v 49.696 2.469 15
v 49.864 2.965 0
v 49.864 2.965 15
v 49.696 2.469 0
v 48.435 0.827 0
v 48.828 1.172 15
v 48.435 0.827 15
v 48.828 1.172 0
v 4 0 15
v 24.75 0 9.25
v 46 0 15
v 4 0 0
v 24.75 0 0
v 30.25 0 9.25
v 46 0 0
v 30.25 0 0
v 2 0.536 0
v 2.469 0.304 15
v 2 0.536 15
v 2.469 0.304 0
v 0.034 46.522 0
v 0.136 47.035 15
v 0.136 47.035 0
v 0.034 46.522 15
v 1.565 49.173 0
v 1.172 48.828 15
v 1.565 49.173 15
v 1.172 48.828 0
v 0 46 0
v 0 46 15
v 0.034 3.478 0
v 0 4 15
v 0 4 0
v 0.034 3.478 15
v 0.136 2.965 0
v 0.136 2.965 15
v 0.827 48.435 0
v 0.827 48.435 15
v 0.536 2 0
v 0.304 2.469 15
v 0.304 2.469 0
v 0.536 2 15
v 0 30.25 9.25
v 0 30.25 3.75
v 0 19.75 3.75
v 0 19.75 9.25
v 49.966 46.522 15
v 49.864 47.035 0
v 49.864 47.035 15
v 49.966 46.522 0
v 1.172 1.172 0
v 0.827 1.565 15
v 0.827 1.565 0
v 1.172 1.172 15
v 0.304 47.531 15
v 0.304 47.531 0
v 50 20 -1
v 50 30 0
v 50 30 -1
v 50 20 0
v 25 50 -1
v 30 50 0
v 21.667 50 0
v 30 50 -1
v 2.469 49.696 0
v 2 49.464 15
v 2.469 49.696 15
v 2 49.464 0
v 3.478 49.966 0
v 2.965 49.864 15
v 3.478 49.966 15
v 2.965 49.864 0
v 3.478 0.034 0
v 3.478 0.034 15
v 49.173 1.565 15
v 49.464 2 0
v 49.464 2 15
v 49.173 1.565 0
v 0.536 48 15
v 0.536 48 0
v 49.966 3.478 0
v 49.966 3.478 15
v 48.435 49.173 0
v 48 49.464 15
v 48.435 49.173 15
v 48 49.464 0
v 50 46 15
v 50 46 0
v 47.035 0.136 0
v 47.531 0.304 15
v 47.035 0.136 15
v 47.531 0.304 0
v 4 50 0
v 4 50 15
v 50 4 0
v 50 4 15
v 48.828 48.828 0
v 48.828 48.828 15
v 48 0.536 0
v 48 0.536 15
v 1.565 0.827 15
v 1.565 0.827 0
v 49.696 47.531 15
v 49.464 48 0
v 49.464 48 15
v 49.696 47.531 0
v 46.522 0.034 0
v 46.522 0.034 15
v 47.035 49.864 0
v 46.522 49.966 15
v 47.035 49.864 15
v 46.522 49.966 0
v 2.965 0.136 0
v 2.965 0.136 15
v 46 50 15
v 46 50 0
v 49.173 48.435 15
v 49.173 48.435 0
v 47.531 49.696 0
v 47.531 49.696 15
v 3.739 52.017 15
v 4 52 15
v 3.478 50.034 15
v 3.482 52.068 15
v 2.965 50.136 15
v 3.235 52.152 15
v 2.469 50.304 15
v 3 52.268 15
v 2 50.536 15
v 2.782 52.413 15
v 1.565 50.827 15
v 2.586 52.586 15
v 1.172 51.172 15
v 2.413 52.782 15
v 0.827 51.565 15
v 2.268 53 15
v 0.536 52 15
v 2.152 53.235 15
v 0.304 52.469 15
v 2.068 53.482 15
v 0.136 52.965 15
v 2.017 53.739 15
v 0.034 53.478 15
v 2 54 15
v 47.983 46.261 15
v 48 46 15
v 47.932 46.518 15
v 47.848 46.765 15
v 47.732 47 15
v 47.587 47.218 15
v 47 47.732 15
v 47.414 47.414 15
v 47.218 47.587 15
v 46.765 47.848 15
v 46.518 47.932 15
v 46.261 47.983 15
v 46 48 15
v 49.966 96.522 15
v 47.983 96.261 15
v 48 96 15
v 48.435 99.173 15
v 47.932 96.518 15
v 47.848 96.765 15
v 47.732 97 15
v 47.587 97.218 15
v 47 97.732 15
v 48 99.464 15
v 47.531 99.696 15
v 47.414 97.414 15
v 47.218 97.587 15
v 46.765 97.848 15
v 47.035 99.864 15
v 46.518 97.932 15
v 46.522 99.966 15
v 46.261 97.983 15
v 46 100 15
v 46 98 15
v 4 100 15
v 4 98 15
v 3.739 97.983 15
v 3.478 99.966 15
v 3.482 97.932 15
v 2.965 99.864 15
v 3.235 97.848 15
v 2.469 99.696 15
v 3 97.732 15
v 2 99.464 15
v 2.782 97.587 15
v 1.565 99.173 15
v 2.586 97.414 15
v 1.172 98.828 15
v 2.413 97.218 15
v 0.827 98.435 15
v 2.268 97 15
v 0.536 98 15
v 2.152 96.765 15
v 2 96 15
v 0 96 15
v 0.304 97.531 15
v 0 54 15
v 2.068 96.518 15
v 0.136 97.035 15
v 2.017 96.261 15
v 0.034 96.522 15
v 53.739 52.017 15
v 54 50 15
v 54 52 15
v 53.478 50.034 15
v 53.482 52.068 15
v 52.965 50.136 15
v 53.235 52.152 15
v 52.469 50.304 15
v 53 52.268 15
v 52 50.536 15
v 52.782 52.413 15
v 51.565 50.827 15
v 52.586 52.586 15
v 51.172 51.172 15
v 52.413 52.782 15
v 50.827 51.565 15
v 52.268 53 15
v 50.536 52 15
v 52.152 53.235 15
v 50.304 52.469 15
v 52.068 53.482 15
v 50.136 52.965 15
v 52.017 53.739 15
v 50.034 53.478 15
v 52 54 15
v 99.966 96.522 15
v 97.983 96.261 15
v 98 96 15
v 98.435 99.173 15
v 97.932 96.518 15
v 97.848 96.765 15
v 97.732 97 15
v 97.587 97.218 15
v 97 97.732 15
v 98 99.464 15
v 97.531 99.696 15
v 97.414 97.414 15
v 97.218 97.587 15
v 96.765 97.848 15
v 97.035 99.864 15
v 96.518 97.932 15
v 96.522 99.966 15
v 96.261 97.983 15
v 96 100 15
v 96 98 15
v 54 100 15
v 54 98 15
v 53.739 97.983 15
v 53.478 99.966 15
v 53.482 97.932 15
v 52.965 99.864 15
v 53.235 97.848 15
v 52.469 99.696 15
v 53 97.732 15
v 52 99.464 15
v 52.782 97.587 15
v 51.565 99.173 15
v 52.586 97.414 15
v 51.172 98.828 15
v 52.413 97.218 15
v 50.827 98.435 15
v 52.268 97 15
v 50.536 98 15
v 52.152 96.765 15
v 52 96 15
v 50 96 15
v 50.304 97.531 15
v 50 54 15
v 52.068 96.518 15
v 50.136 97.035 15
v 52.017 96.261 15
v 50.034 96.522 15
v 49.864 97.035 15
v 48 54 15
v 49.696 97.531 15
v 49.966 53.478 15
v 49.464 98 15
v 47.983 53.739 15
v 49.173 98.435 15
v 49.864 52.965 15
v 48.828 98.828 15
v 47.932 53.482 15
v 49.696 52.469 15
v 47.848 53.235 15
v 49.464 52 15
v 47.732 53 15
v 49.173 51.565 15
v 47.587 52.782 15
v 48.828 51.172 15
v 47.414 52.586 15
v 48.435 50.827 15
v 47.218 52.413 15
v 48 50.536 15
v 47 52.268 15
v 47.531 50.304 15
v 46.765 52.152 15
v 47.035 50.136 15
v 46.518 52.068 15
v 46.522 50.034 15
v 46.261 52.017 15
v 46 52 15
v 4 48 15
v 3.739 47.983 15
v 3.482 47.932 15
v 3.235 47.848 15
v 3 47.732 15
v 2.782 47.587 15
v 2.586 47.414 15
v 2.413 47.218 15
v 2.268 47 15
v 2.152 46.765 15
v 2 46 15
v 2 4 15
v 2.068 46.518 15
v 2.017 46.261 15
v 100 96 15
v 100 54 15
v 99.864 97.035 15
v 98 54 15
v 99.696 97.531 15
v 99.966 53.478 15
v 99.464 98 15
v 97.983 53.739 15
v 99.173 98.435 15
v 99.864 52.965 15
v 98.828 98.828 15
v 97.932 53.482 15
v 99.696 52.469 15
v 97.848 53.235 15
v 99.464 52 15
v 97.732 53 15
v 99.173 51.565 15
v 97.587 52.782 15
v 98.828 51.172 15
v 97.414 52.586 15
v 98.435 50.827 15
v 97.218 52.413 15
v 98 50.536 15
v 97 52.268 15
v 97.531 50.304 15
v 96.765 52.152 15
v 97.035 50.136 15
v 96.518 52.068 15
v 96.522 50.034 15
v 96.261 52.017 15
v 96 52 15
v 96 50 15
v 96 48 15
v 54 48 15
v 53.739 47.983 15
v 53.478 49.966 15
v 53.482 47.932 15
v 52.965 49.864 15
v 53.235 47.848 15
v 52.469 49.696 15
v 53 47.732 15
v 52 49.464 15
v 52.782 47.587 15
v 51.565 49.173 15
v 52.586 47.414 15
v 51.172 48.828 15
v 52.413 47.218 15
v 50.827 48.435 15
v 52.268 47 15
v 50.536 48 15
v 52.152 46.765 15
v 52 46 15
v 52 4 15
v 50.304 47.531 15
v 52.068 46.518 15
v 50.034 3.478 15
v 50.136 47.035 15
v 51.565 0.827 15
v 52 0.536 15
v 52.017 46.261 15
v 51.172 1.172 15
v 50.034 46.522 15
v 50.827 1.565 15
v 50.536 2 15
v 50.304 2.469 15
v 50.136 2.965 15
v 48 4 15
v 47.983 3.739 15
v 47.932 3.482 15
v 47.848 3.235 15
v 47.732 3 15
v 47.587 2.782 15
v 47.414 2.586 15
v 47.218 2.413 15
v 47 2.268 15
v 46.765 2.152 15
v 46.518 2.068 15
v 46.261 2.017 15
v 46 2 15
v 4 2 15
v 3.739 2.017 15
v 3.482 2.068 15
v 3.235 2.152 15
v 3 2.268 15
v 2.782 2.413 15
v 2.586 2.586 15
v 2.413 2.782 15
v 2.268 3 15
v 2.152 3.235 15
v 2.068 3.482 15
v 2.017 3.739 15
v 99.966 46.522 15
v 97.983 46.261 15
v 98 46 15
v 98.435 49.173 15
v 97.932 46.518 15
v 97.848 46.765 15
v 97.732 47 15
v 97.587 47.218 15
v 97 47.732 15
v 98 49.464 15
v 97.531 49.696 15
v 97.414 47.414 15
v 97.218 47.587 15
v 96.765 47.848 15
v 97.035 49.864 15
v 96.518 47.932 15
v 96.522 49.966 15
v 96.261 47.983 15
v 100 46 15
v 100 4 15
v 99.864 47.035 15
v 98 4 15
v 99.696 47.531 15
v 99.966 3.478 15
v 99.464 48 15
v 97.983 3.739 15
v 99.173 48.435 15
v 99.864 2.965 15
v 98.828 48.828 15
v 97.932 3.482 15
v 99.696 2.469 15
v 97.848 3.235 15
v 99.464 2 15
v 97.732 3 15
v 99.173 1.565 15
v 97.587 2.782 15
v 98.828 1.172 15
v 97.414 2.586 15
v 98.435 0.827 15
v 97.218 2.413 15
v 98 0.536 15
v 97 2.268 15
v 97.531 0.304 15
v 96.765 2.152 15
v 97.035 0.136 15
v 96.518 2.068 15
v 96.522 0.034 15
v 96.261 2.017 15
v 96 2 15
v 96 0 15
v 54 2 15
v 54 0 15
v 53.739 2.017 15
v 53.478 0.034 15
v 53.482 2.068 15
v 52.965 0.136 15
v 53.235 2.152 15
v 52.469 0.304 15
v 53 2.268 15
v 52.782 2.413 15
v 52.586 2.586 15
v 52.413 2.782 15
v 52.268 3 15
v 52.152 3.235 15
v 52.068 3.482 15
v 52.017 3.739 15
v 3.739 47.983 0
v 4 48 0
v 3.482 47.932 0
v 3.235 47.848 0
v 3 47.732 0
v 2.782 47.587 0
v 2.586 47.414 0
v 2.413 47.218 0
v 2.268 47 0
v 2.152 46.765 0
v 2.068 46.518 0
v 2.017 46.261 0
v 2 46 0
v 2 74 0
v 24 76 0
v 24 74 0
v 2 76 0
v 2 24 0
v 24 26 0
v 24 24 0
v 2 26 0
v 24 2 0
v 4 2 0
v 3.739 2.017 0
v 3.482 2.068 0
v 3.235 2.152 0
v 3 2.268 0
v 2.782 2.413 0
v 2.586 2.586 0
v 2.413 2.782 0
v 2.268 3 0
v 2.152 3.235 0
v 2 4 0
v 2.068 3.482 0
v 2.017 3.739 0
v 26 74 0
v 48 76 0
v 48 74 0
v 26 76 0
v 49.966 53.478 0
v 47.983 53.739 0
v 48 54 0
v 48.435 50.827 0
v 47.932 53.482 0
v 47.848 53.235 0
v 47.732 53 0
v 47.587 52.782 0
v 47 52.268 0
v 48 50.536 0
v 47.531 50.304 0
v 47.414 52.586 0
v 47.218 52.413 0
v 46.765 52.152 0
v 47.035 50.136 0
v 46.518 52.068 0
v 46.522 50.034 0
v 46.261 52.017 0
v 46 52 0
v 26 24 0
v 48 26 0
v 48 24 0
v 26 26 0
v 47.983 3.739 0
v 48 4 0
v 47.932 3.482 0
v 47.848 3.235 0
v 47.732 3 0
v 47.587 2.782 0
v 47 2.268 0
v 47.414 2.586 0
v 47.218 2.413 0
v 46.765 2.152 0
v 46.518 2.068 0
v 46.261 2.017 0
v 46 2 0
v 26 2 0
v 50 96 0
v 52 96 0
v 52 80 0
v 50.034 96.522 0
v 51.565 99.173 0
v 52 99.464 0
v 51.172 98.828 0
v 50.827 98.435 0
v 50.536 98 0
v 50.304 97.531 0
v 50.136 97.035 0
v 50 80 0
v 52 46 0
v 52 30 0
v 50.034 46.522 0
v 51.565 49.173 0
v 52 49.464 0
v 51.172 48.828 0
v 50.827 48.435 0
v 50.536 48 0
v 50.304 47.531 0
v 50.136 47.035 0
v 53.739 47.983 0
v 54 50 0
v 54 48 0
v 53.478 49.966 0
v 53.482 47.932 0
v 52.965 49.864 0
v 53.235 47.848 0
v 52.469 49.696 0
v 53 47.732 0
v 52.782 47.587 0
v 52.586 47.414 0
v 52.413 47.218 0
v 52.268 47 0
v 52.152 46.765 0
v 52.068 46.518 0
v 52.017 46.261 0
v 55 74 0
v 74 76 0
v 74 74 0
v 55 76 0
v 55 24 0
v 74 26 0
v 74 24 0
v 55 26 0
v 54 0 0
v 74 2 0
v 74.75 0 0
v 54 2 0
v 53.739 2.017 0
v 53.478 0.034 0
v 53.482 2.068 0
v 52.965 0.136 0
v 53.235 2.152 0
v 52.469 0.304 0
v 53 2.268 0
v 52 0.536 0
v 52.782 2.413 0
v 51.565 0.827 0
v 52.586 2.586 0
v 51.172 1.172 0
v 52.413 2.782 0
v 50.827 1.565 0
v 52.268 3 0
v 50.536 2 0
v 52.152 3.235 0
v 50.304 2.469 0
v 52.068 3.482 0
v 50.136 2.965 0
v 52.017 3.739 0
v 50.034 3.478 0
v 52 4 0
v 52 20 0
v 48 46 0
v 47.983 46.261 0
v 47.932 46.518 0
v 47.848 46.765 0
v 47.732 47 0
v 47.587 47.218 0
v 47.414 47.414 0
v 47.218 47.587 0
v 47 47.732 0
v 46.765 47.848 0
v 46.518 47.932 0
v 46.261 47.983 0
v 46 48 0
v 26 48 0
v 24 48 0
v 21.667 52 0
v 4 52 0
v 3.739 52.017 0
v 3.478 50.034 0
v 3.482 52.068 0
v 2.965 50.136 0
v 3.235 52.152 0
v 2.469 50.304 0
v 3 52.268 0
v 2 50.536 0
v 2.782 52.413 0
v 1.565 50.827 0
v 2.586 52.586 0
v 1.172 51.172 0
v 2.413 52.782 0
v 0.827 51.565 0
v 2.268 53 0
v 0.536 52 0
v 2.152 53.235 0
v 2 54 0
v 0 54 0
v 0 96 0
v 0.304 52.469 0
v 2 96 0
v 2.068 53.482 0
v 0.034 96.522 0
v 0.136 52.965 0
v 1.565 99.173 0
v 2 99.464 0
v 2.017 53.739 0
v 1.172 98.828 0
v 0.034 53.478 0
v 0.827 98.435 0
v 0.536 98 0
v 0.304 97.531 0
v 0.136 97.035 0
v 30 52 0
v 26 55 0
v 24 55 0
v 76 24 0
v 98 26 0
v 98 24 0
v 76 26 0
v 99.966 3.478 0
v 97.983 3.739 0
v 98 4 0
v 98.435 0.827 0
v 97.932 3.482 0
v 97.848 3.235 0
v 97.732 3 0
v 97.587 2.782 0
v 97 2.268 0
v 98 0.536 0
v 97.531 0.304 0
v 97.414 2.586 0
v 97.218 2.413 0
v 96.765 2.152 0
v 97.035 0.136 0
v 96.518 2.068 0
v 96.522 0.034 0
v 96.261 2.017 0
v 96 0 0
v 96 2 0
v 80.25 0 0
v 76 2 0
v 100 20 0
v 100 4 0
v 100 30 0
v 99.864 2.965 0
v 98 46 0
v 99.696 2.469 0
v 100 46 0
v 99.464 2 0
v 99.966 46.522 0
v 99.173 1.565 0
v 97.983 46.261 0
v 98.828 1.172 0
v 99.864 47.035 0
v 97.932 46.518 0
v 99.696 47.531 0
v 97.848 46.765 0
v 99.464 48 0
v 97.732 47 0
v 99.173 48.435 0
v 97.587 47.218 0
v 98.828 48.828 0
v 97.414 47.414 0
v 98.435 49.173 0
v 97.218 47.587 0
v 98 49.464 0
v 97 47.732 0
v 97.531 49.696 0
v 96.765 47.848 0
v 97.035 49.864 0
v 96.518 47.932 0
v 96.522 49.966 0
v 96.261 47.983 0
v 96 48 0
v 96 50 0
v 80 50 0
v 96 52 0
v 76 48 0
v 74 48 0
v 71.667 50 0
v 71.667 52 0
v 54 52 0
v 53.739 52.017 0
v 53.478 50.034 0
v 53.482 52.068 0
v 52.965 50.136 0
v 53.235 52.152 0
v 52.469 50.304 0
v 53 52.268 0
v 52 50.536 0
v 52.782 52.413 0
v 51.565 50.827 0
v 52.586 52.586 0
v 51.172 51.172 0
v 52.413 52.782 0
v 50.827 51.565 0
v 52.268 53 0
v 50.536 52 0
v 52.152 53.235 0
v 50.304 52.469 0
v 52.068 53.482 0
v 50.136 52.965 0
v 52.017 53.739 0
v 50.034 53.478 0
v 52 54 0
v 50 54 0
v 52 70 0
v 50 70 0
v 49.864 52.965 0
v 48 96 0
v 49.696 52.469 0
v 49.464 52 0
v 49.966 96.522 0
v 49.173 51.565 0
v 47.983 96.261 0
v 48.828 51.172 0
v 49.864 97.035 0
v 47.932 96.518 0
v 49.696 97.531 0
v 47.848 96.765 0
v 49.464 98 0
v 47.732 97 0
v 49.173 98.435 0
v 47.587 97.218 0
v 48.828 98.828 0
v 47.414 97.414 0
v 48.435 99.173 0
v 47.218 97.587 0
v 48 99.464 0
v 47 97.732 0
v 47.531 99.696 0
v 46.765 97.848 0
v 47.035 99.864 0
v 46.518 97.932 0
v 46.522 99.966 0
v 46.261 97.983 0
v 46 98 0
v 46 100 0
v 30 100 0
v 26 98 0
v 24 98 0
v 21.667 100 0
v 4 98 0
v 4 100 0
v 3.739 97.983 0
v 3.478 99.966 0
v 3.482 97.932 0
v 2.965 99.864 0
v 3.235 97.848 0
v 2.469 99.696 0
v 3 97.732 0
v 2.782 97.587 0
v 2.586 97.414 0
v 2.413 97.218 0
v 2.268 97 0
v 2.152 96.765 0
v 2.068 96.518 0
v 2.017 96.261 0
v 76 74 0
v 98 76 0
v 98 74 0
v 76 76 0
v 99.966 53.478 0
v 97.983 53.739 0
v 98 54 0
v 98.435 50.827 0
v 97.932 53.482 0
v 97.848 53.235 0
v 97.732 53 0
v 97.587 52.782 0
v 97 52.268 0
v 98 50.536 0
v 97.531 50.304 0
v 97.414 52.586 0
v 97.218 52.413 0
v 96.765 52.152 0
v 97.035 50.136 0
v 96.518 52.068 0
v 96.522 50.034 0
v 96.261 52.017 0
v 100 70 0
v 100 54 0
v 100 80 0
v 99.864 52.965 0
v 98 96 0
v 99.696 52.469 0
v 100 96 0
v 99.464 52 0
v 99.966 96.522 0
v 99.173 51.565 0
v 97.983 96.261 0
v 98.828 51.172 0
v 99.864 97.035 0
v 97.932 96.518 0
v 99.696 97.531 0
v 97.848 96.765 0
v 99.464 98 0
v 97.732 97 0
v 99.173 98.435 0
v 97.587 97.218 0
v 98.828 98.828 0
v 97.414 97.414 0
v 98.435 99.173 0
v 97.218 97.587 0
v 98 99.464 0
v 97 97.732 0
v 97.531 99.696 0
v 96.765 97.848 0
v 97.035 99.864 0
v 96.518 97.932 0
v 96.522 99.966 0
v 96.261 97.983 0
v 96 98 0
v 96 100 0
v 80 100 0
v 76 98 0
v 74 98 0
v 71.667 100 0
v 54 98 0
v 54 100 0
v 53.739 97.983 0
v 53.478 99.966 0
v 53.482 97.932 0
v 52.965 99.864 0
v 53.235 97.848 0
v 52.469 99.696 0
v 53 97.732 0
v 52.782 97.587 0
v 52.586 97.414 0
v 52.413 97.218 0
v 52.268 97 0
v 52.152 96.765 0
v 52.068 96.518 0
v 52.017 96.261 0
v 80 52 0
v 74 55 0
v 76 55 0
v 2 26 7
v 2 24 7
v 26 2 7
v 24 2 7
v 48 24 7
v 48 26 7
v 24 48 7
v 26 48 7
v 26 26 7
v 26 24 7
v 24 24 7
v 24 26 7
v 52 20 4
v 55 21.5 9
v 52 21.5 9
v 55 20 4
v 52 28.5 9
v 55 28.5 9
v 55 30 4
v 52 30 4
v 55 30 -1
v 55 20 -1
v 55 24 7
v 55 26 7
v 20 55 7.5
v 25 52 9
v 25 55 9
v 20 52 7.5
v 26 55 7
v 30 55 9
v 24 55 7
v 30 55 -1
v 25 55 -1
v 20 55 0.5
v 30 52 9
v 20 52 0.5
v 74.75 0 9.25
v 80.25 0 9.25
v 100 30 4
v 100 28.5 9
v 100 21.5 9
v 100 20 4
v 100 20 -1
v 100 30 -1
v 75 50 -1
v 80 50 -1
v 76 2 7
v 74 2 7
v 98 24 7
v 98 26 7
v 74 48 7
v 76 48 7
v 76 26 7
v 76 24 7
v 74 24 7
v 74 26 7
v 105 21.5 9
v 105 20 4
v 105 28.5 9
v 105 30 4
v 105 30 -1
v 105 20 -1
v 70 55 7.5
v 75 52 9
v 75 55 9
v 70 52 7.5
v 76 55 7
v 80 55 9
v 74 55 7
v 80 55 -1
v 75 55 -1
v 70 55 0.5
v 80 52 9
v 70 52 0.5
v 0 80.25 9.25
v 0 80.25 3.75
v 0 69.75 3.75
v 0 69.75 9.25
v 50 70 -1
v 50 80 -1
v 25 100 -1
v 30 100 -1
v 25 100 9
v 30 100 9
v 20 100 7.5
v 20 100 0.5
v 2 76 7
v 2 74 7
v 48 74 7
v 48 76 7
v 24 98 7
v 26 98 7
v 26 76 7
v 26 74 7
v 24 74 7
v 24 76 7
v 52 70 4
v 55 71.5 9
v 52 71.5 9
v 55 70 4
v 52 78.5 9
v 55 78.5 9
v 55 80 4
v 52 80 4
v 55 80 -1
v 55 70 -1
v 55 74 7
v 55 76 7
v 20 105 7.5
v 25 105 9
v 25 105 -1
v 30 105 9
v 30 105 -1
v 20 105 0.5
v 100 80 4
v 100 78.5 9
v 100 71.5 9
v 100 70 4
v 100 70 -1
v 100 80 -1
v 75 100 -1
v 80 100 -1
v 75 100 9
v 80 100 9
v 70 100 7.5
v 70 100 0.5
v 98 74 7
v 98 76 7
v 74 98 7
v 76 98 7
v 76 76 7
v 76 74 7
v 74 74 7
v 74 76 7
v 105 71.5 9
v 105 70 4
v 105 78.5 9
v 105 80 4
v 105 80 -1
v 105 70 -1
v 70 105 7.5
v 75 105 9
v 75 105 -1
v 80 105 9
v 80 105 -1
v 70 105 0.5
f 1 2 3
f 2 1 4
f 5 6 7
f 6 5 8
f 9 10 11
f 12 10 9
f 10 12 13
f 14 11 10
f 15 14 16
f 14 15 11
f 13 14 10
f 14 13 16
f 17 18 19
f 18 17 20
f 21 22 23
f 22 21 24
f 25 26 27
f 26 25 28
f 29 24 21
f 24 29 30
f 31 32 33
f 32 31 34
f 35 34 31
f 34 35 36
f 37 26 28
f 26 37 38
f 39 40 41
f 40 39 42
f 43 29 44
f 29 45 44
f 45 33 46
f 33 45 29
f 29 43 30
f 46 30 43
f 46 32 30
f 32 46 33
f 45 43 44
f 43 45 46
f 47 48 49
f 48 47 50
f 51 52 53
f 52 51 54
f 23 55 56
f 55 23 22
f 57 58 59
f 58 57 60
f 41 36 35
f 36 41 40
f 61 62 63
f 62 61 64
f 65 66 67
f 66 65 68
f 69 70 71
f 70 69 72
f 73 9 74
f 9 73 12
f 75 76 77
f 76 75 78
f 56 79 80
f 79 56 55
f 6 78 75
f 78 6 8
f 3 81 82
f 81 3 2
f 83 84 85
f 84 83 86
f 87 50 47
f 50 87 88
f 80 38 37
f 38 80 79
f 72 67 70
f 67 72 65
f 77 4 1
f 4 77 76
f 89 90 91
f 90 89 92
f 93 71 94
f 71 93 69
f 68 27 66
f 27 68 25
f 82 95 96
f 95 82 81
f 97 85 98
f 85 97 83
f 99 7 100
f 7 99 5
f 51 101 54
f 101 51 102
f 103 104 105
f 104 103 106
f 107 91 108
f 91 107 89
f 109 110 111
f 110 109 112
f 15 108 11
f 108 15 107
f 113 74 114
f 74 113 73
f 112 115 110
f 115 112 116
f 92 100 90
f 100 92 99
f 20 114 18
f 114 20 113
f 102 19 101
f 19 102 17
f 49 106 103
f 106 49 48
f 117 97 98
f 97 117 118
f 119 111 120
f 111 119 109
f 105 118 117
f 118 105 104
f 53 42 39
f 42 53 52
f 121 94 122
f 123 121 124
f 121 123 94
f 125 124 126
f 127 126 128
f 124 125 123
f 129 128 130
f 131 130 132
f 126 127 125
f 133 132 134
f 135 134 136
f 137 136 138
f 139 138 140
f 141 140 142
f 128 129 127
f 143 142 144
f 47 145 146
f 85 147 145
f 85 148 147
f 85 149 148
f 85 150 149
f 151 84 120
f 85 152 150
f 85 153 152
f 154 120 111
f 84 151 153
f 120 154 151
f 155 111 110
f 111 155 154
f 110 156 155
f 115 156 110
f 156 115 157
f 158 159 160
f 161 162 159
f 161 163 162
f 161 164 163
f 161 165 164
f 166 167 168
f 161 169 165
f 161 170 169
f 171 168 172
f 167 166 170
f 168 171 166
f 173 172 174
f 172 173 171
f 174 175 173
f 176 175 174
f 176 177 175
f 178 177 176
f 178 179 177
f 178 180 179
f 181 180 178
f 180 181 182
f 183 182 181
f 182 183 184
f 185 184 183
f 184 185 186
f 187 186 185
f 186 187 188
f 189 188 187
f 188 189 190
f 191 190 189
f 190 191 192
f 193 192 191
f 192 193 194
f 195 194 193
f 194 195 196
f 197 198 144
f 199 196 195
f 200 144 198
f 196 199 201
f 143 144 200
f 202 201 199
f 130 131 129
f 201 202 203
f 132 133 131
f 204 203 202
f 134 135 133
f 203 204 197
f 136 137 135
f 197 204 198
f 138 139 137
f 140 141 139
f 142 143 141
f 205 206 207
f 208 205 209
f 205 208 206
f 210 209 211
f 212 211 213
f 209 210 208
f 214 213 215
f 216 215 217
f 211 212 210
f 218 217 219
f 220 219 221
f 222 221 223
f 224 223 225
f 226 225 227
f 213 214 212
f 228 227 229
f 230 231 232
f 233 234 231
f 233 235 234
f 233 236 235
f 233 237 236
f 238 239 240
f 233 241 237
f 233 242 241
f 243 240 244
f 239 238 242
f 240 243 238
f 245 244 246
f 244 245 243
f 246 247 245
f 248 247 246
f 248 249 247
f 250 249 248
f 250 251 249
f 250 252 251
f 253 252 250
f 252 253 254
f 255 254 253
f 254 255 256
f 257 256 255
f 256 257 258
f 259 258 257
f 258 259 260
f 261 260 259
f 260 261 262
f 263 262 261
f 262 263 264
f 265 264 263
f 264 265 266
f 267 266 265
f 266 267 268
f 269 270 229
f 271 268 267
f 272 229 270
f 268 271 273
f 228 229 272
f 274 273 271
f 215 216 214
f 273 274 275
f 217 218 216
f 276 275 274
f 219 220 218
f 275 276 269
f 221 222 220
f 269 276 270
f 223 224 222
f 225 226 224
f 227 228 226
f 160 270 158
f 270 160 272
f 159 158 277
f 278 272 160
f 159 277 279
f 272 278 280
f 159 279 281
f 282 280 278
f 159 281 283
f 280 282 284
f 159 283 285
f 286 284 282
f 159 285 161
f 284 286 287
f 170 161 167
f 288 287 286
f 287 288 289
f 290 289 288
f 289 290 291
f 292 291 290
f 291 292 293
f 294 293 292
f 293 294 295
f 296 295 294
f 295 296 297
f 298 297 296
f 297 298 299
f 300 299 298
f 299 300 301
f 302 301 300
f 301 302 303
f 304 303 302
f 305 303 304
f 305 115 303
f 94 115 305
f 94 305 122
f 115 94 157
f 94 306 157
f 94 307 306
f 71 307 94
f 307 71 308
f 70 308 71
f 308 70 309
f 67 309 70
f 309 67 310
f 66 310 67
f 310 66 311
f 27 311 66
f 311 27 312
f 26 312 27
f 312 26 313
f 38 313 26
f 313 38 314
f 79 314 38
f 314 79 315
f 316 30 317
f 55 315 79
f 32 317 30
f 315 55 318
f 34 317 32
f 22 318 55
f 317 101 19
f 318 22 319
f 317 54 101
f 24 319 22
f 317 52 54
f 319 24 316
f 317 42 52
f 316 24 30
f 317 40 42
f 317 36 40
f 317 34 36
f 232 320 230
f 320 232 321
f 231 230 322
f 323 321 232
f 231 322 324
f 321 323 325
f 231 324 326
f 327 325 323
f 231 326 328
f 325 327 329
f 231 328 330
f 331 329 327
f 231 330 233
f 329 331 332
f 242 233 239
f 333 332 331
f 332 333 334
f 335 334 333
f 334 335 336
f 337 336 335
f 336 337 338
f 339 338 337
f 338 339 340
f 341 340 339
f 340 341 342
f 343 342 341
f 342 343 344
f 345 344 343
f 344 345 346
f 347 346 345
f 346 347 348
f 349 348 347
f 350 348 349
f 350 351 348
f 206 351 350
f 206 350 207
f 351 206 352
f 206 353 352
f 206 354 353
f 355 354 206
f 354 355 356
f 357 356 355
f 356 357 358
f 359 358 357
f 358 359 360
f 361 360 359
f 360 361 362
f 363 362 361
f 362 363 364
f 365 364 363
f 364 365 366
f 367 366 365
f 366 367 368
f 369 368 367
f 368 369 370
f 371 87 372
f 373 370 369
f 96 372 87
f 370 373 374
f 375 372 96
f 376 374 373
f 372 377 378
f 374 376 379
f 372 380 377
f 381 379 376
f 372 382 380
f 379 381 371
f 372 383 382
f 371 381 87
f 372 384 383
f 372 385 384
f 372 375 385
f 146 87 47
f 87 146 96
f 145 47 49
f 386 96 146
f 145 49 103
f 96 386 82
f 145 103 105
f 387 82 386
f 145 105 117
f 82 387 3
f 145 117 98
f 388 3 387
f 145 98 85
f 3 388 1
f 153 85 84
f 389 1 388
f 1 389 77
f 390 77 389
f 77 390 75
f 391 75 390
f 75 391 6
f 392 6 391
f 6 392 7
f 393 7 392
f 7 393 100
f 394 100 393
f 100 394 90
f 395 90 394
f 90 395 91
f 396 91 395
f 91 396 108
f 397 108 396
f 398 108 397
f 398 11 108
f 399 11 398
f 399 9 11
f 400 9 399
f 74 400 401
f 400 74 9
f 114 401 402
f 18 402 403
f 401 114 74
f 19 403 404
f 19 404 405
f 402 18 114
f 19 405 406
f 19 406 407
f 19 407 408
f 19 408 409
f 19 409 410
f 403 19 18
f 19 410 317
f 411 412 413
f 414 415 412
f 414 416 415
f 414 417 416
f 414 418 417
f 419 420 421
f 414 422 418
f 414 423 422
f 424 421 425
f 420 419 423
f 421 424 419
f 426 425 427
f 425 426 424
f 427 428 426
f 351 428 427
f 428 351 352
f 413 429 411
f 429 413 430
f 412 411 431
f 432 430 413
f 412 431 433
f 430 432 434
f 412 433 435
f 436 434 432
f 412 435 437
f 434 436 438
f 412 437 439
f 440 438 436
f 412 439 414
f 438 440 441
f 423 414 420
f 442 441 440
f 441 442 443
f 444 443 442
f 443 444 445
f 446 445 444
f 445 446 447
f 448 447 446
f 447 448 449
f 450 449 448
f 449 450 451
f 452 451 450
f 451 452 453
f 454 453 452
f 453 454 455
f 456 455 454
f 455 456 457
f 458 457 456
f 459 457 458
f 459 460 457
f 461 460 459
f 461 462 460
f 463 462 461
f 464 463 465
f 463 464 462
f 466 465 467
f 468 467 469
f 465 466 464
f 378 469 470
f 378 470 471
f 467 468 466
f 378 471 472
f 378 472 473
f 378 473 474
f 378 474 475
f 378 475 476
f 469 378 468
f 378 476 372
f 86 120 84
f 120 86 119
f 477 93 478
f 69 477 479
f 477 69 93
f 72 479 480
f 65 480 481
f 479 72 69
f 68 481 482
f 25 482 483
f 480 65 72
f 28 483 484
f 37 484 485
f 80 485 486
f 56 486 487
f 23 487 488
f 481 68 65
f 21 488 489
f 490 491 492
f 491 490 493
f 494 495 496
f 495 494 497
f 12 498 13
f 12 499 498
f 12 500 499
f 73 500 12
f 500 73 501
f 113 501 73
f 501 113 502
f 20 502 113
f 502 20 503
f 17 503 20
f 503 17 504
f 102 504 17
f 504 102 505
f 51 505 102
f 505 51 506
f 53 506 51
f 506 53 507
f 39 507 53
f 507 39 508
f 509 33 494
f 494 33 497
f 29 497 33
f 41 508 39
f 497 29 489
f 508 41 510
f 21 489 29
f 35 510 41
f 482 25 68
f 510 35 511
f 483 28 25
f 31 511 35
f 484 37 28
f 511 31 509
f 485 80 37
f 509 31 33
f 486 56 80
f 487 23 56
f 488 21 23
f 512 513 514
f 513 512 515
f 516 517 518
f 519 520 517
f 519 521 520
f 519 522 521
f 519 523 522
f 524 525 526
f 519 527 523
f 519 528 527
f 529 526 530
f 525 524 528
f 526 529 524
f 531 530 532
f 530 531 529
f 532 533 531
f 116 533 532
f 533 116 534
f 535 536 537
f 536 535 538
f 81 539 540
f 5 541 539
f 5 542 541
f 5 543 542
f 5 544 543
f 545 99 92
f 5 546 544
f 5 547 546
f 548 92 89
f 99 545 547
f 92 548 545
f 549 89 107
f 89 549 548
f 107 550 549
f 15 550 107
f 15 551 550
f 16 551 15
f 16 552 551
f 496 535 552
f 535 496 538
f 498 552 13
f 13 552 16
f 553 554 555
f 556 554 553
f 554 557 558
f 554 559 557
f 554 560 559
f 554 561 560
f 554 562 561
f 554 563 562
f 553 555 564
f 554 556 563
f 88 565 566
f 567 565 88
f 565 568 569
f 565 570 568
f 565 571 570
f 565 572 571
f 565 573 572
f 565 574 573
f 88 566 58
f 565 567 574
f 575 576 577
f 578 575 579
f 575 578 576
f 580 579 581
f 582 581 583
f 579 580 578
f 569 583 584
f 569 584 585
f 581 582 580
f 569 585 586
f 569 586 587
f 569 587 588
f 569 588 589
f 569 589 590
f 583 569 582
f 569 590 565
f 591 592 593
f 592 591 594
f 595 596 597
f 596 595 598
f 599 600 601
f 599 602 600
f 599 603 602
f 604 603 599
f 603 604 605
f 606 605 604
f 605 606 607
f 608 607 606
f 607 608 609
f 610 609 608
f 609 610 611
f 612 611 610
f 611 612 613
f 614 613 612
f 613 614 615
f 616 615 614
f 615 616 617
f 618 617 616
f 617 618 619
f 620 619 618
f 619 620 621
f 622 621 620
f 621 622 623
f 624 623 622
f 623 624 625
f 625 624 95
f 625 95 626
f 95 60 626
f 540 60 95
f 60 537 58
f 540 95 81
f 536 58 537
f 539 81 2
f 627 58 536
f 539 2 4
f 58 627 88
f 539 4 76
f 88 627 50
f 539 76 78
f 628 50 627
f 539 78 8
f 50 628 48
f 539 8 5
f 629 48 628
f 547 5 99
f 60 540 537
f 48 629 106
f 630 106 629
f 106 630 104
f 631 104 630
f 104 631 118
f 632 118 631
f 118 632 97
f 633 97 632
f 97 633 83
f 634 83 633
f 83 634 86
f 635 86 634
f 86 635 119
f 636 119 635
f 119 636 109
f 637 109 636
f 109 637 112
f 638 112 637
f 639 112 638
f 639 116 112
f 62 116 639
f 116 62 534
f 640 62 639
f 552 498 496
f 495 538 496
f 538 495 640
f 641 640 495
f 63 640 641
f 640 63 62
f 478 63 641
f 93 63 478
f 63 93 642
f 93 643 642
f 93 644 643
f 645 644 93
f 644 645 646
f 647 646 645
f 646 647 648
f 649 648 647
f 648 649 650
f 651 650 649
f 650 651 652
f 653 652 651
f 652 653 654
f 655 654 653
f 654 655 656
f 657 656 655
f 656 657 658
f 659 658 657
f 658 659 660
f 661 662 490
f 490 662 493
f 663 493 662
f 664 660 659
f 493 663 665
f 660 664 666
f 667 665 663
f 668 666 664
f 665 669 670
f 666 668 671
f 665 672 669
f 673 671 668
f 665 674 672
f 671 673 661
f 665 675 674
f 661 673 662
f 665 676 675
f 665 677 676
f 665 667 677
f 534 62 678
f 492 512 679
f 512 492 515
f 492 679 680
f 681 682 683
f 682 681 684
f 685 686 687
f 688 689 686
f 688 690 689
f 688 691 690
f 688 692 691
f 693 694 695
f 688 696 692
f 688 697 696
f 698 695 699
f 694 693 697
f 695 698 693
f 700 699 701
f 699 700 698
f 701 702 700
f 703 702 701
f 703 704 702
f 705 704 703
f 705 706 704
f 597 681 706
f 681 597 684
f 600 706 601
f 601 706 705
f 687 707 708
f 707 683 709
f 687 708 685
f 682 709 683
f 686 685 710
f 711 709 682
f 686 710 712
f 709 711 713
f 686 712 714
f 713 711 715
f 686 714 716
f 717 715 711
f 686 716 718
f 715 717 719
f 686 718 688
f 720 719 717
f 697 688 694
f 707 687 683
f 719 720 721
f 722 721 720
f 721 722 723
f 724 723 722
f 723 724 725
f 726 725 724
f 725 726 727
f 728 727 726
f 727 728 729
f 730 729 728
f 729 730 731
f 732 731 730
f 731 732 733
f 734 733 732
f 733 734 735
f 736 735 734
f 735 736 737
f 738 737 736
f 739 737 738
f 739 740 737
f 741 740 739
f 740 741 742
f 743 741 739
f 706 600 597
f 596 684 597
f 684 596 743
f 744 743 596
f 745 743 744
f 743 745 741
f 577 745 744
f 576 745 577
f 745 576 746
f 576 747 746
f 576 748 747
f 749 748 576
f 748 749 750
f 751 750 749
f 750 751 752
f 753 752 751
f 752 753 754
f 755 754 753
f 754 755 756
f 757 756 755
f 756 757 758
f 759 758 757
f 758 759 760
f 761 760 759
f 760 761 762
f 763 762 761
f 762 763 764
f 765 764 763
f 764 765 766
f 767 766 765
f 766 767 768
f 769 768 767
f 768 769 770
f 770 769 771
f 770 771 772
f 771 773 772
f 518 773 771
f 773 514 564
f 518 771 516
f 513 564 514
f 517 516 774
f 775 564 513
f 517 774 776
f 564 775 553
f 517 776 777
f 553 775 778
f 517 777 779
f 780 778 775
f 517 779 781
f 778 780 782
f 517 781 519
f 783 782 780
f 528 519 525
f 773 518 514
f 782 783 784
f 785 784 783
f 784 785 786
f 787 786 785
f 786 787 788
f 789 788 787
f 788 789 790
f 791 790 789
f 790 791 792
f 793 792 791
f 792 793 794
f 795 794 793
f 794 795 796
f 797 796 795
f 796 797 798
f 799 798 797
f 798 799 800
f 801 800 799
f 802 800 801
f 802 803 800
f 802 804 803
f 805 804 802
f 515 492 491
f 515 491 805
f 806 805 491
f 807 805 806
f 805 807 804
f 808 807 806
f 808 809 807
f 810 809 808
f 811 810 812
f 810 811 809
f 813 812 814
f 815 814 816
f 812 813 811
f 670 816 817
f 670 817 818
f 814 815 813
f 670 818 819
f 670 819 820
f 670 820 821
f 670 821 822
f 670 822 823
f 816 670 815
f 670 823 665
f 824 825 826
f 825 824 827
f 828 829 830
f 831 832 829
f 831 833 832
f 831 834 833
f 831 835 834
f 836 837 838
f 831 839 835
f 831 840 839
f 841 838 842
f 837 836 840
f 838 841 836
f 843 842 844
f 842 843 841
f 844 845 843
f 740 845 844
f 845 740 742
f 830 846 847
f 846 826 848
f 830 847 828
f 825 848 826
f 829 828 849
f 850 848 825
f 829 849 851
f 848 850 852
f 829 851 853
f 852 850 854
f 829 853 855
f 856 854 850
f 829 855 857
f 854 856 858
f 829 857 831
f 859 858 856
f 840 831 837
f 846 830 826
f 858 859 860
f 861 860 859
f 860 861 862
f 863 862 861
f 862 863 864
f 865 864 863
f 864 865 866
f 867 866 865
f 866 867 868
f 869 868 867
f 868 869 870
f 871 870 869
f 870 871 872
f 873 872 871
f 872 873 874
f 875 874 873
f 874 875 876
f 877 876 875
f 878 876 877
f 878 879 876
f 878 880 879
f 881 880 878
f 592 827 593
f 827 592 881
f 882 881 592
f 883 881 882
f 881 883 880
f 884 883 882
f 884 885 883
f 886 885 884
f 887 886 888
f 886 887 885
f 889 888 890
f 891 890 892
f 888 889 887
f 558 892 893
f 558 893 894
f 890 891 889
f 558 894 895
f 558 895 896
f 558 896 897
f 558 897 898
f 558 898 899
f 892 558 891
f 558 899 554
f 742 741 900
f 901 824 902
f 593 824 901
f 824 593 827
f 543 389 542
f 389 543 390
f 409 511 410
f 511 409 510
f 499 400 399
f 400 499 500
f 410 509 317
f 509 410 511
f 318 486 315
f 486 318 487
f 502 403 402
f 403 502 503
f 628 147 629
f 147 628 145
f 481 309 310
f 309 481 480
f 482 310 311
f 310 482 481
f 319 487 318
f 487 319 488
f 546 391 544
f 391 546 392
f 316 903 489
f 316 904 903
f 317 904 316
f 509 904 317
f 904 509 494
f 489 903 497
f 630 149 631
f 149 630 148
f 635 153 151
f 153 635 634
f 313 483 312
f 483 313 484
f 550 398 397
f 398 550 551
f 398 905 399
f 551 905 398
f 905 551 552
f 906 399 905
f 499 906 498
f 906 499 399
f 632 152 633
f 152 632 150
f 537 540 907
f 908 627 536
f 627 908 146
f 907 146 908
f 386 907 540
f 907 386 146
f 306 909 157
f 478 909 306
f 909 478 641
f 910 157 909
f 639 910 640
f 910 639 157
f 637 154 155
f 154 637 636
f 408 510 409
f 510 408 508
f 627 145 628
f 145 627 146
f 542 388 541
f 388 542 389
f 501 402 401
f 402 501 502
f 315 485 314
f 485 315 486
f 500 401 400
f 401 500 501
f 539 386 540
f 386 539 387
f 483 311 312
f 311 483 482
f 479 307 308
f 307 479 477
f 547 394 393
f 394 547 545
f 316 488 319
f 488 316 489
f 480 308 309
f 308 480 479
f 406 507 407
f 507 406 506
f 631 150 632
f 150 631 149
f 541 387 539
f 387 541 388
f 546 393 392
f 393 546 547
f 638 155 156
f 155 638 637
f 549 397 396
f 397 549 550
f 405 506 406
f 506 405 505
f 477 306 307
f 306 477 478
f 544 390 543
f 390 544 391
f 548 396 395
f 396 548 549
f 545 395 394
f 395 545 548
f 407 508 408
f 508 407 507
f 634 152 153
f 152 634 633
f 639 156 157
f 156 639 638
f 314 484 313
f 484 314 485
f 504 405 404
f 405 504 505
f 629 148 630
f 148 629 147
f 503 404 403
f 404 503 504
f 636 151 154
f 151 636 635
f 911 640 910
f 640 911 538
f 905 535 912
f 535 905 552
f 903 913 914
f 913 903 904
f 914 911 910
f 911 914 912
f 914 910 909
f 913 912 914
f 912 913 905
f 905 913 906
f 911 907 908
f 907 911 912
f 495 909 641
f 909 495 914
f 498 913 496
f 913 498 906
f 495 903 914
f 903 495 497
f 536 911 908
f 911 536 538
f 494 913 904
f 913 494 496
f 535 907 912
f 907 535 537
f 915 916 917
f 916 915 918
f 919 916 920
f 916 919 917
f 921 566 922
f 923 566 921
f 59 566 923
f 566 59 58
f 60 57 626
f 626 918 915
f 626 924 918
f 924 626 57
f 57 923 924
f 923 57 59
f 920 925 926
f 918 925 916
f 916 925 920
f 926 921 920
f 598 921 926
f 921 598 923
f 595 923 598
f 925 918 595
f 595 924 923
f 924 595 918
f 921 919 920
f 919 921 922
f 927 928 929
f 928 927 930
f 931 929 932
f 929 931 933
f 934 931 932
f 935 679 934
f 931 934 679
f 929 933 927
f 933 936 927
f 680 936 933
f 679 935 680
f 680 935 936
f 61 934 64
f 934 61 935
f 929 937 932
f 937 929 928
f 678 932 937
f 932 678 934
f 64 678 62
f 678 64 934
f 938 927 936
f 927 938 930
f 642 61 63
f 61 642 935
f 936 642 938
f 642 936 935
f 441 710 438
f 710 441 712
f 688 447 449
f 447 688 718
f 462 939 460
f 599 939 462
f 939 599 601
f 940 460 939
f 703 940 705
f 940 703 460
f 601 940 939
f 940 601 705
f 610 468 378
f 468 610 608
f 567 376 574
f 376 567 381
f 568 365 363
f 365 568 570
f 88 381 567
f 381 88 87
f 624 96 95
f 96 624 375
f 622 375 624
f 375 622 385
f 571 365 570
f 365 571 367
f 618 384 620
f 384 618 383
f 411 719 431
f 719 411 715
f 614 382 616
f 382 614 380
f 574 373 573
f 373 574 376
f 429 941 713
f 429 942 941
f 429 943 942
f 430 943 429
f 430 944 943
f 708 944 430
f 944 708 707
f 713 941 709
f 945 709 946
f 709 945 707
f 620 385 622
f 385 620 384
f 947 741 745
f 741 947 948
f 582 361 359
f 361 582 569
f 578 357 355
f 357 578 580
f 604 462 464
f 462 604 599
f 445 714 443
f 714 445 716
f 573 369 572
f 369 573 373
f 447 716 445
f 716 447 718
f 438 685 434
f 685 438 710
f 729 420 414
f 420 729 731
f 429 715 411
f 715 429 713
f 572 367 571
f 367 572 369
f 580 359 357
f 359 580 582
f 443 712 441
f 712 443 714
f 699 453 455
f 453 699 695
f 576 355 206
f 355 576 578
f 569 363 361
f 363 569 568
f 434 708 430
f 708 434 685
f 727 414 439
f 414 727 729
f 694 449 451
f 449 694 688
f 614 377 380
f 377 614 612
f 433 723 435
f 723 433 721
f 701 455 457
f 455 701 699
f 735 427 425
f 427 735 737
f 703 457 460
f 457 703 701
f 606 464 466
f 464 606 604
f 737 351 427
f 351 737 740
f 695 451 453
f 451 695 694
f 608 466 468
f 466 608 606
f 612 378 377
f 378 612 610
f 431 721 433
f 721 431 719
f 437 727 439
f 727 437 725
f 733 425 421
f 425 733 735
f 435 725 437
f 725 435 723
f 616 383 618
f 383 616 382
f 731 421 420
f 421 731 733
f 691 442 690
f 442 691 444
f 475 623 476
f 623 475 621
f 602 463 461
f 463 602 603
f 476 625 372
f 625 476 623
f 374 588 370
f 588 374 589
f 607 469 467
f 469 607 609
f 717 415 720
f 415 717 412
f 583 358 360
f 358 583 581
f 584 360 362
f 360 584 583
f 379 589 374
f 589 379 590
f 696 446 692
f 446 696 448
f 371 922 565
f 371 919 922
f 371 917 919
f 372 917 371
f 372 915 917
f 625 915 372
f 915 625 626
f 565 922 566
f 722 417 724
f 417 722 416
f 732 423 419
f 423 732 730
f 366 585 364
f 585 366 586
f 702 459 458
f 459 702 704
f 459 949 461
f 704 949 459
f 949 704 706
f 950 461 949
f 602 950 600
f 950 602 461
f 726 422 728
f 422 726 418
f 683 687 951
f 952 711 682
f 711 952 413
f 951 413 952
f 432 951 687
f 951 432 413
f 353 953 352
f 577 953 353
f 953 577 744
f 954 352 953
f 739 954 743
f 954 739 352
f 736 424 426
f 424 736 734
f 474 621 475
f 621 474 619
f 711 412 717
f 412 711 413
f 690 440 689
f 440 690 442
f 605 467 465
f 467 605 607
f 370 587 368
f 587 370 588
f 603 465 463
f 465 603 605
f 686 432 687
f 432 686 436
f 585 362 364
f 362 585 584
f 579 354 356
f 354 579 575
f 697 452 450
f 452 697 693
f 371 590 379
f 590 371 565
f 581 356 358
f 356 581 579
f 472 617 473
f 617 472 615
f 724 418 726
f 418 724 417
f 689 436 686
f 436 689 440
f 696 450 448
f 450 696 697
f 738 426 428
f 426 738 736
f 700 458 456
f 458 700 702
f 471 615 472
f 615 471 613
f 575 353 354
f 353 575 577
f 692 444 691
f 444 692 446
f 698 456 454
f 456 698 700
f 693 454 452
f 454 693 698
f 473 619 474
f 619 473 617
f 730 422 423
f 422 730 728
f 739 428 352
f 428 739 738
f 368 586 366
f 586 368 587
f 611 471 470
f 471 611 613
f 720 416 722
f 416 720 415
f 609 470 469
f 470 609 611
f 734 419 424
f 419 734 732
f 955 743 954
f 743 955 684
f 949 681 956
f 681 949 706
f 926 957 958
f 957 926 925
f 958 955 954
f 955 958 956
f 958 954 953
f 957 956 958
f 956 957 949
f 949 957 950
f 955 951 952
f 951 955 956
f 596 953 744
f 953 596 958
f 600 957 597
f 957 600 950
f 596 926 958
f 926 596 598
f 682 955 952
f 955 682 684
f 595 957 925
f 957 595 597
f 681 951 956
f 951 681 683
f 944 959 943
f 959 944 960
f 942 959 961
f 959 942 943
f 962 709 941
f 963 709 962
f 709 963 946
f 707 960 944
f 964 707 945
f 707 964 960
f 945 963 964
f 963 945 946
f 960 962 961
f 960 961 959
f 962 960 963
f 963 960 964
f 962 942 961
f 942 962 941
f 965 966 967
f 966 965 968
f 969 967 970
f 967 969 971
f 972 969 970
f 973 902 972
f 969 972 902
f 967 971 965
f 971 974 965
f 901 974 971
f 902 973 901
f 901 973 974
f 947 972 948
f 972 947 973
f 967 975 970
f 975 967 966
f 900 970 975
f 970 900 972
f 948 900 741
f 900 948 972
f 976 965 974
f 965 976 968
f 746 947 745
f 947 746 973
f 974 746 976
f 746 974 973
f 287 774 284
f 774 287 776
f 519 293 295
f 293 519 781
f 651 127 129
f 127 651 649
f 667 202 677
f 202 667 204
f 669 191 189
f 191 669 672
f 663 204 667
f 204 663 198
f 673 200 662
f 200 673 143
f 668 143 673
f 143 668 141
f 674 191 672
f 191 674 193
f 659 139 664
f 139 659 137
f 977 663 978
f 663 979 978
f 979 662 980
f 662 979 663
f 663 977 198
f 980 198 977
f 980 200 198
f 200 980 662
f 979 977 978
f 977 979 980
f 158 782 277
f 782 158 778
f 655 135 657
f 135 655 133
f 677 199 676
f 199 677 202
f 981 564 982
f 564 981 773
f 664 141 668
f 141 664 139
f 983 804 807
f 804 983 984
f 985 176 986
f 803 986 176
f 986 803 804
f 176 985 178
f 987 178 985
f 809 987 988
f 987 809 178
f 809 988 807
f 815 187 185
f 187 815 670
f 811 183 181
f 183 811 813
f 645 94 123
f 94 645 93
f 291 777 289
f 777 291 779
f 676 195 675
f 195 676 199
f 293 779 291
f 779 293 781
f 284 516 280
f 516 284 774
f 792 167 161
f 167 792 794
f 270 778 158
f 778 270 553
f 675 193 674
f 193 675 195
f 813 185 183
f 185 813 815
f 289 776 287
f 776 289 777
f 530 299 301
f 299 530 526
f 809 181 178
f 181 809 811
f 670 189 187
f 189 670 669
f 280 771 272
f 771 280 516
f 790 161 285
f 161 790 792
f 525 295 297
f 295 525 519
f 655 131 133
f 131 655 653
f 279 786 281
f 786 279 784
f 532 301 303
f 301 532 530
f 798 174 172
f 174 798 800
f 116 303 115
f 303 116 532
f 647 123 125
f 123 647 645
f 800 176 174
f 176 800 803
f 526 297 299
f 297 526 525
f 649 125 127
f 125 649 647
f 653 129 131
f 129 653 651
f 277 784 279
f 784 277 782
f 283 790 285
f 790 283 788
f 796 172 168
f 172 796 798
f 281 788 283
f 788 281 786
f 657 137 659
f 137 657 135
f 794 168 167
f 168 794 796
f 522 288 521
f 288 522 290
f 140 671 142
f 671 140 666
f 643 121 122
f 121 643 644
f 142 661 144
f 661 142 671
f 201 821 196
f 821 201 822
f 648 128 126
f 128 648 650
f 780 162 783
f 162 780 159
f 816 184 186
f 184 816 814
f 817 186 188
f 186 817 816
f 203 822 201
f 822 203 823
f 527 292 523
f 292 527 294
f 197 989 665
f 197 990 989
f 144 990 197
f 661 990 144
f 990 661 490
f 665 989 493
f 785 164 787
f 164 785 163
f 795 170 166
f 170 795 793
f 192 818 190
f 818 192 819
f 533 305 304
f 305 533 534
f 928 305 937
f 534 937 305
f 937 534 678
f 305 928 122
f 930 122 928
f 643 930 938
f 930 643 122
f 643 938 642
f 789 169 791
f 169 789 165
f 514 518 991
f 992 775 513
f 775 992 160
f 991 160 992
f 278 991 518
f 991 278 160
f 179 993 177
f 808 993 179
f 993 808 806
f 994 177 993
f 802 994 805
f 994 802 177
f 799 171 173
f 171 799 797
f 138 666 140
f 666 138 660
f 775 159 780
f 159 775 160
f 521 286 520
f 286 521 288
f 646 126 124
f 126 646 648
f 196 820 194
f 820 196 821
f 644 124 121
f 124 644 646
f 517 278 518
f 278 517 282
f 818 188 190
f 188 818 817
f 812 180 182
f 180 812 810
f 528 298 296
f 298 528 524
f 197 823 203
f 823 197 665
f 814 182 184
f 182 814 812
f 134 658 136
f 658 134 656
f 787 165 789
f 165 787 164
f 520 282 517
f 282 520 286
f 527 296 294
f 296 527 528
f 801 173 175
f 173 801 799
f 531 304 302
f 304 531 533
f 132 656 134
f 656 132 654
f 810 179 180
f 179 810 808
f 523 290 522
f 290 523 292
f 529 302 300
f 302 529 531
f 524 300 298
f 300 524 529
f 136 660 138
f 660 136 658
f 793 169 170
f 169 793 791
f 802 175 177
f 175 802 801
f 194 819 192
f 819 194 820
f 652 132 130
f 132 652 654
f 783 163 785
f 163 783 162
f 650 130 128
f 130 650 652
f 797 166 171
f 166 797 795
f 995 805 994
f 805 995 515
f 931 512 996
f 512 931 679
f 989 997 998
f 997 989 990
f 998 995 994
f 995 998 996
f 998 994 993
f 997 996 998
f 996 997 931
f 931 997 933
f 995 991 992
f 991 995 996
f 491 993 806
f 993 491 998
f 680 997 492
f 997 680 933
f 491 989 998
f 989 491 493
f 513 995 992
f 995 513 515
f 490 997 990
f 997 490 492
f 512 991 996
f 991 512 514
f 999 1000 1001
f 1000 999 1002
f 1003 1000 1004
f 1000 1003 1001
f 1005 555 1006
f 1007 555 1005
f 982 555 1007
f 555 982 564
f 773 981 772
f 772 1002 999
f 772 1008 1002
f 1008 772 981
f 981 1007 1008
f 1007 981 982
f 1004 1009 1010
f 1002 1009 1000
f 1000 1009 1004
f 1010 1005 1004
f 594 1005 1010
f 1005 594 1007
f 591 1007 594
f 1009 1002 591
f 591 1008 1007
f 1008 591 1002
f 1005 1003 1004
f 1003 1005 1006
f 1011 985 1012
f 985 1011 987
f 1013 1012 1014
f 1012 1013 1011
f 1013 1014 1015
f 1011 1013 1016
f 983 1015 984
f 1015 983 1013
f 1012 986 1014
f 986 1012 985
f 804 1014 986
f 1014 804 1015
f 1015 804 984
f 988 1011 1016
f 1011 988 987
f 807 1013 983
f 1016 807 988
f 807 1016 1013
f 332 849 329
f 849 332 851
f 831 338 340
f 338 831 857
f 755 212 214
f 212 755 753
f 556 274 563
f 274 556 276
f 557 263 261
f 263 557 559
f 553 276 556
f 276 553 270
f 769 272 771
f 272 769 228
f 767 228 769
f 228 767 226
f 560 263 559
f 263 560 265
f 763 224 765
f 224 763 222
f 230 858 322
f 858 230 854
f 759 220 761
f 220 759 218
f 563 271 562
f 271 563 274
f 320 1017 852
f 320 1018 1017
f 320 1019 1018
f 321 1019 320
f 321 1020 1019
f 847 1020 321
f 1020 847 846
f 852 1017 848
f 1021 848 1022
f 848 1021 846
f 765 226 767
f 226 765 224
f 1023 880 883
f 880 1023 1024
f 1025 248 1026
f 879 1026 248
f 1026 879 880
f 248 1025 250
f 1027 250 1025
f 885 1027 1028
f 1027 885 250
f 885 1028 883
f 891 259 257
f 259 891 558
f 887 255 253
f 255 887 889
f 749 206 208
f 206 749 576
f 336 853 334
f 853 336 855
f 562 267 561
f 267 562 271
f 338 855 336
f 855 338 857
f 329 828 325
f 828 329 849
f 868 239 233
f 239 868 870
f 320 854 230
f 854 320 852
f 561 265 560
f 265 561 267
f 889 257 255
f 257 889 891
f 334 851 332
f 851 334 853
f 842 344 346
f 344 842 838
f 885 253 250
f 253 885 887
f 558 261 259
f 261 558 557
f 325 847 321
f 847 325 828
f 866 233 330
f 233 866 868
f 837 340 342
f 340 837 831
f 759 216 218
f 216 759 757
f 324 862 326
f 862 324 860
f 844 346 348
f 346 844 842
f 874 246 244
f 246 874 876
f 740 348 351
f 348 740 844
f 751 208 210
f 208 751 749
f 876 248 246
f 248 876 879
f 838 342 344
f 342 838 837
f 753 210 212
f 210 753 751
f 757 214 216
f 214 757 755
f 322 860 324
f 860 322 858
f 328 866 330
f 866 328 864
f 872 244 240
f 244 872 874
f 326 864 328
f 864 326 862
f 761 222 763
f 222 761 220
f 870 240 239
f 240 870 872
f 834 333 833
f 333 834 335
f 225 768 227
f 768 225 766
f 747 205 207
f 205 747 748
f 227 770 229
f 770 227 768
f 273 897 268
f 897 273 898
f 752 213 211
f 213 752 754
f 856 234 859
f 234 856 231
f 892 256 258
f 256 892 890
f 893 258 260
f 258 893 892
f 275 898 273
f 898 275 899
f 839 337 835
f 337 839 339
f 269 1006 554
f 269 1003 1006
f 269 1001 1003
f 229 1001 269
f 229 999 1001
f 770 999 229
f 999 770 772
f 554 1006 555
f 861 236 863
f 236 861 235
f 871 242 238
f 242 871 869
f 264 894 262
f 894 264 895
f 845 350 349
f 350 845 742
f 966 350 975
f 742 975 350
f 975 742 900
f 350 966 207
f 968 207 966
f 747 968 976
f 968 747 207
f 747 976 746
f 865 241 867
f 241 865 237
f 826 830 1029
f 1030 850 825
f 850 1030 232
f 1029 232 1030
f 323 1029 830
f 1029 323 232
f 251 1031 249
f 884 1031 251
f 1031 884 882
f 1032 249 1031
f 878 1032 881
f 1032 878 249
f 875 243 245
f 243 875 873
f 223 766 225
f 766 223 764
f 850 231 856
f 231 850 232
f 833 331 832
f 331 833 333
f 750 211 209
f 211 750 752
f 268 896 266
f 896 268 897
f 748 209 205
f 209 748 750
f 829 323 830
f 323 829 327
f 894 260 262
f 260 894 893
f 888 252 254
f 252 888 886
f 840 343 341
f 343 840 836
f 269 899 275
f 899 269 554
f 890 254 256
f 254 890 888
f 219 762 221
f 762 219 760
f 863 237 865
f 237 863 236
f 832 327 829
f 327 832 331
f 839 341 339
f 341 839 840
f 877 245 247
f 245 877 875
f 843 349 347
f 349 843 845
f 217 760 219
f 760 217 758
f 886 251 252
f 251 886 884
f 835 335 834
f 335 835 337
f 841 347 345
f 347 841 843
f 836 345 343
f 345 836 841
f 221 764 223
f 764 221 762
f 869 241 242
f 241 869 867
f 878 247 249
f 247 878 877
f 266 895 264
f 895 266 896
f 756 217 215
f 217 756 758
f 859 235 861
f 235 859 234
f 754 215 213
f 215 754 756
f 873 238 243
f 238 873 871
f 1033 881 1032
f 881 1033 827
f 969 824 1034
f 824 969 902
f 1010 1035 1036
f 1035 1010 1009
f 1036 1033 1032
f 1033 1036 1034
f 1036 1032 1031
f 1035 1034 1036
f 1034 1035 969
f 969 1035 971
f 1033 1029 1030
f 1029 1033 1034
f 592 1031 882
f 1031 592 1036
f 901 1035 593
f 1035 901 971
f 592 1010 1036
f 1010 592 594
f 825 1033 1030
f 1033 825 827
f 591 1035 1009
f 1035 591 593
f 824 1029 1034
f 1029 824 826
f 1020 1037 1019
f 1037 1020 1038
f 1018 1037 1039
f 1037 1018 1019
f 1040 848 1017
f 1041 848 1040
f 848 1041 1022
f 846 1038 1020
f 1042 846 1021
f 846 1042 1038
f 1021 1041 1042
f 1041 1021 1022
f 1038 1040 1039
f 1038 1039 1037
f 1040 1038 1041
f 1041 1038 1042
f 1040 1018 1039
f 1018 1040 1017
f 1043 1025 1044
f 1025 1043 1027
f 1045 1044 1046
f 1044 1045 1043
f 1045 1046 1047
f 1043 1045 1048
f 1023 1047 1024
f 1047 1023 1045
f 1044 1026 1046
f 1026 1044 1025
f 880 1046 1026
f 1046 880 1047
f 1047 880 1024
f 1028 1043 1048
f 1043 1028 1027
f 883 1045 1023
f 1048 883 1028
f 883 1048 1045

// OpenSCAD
//
// MODULAR PANEL SYSTEM
//
// Sizes:
//   S = 50 x 50 x 15 mm
//   M = 100 x 100 x 15 mm
//   L = 250 x 250 x 15 mm
//
// Units: mm
//

$fn = 48;


// ============================================================
// PARAMETERS
// ============================================================

WALL        = 2.0;
TOP         = 0.0;
BOTTOM      = 0.0;

CORNER_R    = 4.0;

PANEL_H     = 15;

// Connector
JOIN_W      = 10;
JOIN_H      = 5;
JOIN_DEPTH  = 5;

CLEARANCE   = 0.25;

DOVETAIL_HEAD_W = 7;
DOVETAIL_BASE_W = 10;

RIB          = 2;
RIB_H        = 7;


// ============================================================
// BASIC GEOMETRY
// ============================================================

module rounded_rect(w, d, r)
{
    hull()
    {
        translate([r, r])
            circle(r);

        translate([w-r, r])
            circle(r);

        translate([r, d-r])
            circle(r);

        translate([w-r, d-r])
            circle(r);
    }
}


// ============================================================
// PANEL OUTER SHELL
// ============================================================

module panel_shell(size)
{
    difference()
    {
        // Outer body
        linear_extrude(PANEL_H)
            rounded_rect(size, size, CORNER_R);

        // Hollow interior. TOP = 0 and BOTTOM = 0 leave both faces open.
        translate([WALL, WALL, BOTTOM])
            linear_extrude(PANEL_H - TOP - BOTTOM)
                rounded_rect(
                    size - 2*WALL,
                    size - 2*WALL,
                    max(0.5, CORNER_R-WALL)
                );
    }
}


// ============================================================
// INTERNAL RIBS
// ============================================================

module ribs(size)
{
    // Cross ribs every 25 mm
    for (x = [25 : 25 : size-25])
    {
        translate([x-RIB/2, WALL, BOTTOM])
            cube([
                RIB,
                size-2*WALL,
                RIB_H
            ]);
    }

    for (y = [25 : 25 : size-25])
    {
        translate([WALL, y-RIB/2, BOTTOM])
            cube([
                size-2*WALL,
                RIB,
                RIB_H
            ]);
    }
}


// ============================================================
// DOVETAIL MALE
// ============================================================

module male_join()
{
    // Horizontal dovetail tongue
    hull()
    {
        translate([-JOIN_DEPTH, -DOVETAIL_HEAD_W/2])
            cube([JOIN_DEPTH, DOVETAIL_HEAD_W, JOIN_H]);

        translate([0, -DOVETAIL_BASE_W/2])
            cube([JOIN_DEPTH, DOVETAIL_BASE_W, JOIN_H]);
    }
}


// ============================================================
// DOVETAIL FEMALE
// ============================================================

module female_join()
{
    // Female cavity
    hull()
    {
        translate([
            -CLEARANCE,
            -DOVETAIL_HEAD_W/2-CLEARANCE
        ])
            cube([
                JOIN_DEPTH + CLEARANCE*2,
                DOVETAIL_HEAD_W + CLEARANCE*2,
                JOIN_H + CLEARANCE*2
            ]);

        translate([
            -CLEARANCE,
            -DOVETAIL_BASE_W/2-CLEARANCE
        ])
            cube([
                JOIN_DEPTH + CLEARANCE*2,
                DOVETAIL_BASE_W + CLEARANCE*2,
                JOIN_H + CLEARANCE*2
            ]);
    }
}


// ============================================================
// EDGE JOIN
//
// connector is placed INSIDE the nominal footprint.
// half of the dovetail is recessed into the panel.
// ============================================================

module male_edge(size, side="right", pos=25)
{
    if (side=="right")
        translate([size, pos, BOTTOM+4])
            rotate([0,90,0])
                male_join();

    if (side=="left")
        translate([0, pos, BOTTOM+4])
            rotate([0,-90,0])
                male_join();

    if (side=="top")
        translate([pos, size, BOTTOM+4])
            rotate([-90,0,0])
                male_join();

    if (side=="bottom")
        translate([pos, 0, BOTTOM+4])
            rotate([90,0,0])
                male_join();
}


module female_edge(size, side="right", pos=25)
{
    if (side=="right")
        translate([size, pos, BOTTOM+4])
            rotate([0,90,0])
                female_join();

    if (side=="left")
        translate([0, pos, BOTTOM+4])
            rotate([0,-90,0])
                female_join();

    if (side=="top")
        translate([pos, size, BOTTOM+4])
            rotate([-90,0,0])
                female_join();

    if (side=="bottom")
        translate([pos, 0, BOTTOM+4])
            rotate([90,0,0])
                female_join();
}


// ============================================================
// CONNECTOR PATTERN
//
// 25 mm grid.
//
// Small 50 mm panel:
//   connectors at 25
//
// Medium 100 mm panel:
//   connectors at 25, 75
//
// Large 250 mm panel:
//   connectors at 25,75,125,175,225
//
// This means:
//
//   50 + 50 = 100
//
// and:
//
//   50 + 50 + 50 + 50 = 100 + 100
//
// etc.
// ============================================================

module female_connectors(size)
{
    for (p = [25 : 50 : size-25])
    {
        female_edge(size, "left", p);
        female_edge(size, "bottom", p);
    }
}

module male_connectors(size)
{
    for (p = [25 : 50 : size-25])
    {
        male_edge(size, "right", p);
        male_edge(size, "top", p);
    }
}


// ============================================================
// PANEL
//
// connector pattern alternates male/female.
// This makes every edge usable.
// ============================================================

module panel(size)
{
    difference()
    {
        union()
        {
            panel_shell(size);
            ribs(size);
        }

        // Female connectors
        //
        female_connectors(size);
    }

    // Male connectors
    //
    male_connectors(size);
}


// ============================================================
// SIMPLE PANEL VARIANTS
// ============================================================

module small()
{
    panel(50);
}

module medium()
{
    panel(100);
}

module large()
{
    panel(250);
}


// ============================================================
// PREVIEW
// ============================================================

// Preview mode: choose one option.
preview = "four_small";

if (preview == "small")
    small();

if (preview == "medium")
    medium();

if (preview == "large")
    large();

// Four 50 mm panels: two by two, using the 25 mm connector grid.
if (preview == "four_small")
{
    small();
    translate([50, 0, 0])
        small();
    translate([0, 50, 0])
        small();
    translate([50, 50, 0])
        small();
}


// Example medium:
//
// translate([0,0,0])
//     medium();


// Example large:
//
// translate([0,0,0])
//     large();
